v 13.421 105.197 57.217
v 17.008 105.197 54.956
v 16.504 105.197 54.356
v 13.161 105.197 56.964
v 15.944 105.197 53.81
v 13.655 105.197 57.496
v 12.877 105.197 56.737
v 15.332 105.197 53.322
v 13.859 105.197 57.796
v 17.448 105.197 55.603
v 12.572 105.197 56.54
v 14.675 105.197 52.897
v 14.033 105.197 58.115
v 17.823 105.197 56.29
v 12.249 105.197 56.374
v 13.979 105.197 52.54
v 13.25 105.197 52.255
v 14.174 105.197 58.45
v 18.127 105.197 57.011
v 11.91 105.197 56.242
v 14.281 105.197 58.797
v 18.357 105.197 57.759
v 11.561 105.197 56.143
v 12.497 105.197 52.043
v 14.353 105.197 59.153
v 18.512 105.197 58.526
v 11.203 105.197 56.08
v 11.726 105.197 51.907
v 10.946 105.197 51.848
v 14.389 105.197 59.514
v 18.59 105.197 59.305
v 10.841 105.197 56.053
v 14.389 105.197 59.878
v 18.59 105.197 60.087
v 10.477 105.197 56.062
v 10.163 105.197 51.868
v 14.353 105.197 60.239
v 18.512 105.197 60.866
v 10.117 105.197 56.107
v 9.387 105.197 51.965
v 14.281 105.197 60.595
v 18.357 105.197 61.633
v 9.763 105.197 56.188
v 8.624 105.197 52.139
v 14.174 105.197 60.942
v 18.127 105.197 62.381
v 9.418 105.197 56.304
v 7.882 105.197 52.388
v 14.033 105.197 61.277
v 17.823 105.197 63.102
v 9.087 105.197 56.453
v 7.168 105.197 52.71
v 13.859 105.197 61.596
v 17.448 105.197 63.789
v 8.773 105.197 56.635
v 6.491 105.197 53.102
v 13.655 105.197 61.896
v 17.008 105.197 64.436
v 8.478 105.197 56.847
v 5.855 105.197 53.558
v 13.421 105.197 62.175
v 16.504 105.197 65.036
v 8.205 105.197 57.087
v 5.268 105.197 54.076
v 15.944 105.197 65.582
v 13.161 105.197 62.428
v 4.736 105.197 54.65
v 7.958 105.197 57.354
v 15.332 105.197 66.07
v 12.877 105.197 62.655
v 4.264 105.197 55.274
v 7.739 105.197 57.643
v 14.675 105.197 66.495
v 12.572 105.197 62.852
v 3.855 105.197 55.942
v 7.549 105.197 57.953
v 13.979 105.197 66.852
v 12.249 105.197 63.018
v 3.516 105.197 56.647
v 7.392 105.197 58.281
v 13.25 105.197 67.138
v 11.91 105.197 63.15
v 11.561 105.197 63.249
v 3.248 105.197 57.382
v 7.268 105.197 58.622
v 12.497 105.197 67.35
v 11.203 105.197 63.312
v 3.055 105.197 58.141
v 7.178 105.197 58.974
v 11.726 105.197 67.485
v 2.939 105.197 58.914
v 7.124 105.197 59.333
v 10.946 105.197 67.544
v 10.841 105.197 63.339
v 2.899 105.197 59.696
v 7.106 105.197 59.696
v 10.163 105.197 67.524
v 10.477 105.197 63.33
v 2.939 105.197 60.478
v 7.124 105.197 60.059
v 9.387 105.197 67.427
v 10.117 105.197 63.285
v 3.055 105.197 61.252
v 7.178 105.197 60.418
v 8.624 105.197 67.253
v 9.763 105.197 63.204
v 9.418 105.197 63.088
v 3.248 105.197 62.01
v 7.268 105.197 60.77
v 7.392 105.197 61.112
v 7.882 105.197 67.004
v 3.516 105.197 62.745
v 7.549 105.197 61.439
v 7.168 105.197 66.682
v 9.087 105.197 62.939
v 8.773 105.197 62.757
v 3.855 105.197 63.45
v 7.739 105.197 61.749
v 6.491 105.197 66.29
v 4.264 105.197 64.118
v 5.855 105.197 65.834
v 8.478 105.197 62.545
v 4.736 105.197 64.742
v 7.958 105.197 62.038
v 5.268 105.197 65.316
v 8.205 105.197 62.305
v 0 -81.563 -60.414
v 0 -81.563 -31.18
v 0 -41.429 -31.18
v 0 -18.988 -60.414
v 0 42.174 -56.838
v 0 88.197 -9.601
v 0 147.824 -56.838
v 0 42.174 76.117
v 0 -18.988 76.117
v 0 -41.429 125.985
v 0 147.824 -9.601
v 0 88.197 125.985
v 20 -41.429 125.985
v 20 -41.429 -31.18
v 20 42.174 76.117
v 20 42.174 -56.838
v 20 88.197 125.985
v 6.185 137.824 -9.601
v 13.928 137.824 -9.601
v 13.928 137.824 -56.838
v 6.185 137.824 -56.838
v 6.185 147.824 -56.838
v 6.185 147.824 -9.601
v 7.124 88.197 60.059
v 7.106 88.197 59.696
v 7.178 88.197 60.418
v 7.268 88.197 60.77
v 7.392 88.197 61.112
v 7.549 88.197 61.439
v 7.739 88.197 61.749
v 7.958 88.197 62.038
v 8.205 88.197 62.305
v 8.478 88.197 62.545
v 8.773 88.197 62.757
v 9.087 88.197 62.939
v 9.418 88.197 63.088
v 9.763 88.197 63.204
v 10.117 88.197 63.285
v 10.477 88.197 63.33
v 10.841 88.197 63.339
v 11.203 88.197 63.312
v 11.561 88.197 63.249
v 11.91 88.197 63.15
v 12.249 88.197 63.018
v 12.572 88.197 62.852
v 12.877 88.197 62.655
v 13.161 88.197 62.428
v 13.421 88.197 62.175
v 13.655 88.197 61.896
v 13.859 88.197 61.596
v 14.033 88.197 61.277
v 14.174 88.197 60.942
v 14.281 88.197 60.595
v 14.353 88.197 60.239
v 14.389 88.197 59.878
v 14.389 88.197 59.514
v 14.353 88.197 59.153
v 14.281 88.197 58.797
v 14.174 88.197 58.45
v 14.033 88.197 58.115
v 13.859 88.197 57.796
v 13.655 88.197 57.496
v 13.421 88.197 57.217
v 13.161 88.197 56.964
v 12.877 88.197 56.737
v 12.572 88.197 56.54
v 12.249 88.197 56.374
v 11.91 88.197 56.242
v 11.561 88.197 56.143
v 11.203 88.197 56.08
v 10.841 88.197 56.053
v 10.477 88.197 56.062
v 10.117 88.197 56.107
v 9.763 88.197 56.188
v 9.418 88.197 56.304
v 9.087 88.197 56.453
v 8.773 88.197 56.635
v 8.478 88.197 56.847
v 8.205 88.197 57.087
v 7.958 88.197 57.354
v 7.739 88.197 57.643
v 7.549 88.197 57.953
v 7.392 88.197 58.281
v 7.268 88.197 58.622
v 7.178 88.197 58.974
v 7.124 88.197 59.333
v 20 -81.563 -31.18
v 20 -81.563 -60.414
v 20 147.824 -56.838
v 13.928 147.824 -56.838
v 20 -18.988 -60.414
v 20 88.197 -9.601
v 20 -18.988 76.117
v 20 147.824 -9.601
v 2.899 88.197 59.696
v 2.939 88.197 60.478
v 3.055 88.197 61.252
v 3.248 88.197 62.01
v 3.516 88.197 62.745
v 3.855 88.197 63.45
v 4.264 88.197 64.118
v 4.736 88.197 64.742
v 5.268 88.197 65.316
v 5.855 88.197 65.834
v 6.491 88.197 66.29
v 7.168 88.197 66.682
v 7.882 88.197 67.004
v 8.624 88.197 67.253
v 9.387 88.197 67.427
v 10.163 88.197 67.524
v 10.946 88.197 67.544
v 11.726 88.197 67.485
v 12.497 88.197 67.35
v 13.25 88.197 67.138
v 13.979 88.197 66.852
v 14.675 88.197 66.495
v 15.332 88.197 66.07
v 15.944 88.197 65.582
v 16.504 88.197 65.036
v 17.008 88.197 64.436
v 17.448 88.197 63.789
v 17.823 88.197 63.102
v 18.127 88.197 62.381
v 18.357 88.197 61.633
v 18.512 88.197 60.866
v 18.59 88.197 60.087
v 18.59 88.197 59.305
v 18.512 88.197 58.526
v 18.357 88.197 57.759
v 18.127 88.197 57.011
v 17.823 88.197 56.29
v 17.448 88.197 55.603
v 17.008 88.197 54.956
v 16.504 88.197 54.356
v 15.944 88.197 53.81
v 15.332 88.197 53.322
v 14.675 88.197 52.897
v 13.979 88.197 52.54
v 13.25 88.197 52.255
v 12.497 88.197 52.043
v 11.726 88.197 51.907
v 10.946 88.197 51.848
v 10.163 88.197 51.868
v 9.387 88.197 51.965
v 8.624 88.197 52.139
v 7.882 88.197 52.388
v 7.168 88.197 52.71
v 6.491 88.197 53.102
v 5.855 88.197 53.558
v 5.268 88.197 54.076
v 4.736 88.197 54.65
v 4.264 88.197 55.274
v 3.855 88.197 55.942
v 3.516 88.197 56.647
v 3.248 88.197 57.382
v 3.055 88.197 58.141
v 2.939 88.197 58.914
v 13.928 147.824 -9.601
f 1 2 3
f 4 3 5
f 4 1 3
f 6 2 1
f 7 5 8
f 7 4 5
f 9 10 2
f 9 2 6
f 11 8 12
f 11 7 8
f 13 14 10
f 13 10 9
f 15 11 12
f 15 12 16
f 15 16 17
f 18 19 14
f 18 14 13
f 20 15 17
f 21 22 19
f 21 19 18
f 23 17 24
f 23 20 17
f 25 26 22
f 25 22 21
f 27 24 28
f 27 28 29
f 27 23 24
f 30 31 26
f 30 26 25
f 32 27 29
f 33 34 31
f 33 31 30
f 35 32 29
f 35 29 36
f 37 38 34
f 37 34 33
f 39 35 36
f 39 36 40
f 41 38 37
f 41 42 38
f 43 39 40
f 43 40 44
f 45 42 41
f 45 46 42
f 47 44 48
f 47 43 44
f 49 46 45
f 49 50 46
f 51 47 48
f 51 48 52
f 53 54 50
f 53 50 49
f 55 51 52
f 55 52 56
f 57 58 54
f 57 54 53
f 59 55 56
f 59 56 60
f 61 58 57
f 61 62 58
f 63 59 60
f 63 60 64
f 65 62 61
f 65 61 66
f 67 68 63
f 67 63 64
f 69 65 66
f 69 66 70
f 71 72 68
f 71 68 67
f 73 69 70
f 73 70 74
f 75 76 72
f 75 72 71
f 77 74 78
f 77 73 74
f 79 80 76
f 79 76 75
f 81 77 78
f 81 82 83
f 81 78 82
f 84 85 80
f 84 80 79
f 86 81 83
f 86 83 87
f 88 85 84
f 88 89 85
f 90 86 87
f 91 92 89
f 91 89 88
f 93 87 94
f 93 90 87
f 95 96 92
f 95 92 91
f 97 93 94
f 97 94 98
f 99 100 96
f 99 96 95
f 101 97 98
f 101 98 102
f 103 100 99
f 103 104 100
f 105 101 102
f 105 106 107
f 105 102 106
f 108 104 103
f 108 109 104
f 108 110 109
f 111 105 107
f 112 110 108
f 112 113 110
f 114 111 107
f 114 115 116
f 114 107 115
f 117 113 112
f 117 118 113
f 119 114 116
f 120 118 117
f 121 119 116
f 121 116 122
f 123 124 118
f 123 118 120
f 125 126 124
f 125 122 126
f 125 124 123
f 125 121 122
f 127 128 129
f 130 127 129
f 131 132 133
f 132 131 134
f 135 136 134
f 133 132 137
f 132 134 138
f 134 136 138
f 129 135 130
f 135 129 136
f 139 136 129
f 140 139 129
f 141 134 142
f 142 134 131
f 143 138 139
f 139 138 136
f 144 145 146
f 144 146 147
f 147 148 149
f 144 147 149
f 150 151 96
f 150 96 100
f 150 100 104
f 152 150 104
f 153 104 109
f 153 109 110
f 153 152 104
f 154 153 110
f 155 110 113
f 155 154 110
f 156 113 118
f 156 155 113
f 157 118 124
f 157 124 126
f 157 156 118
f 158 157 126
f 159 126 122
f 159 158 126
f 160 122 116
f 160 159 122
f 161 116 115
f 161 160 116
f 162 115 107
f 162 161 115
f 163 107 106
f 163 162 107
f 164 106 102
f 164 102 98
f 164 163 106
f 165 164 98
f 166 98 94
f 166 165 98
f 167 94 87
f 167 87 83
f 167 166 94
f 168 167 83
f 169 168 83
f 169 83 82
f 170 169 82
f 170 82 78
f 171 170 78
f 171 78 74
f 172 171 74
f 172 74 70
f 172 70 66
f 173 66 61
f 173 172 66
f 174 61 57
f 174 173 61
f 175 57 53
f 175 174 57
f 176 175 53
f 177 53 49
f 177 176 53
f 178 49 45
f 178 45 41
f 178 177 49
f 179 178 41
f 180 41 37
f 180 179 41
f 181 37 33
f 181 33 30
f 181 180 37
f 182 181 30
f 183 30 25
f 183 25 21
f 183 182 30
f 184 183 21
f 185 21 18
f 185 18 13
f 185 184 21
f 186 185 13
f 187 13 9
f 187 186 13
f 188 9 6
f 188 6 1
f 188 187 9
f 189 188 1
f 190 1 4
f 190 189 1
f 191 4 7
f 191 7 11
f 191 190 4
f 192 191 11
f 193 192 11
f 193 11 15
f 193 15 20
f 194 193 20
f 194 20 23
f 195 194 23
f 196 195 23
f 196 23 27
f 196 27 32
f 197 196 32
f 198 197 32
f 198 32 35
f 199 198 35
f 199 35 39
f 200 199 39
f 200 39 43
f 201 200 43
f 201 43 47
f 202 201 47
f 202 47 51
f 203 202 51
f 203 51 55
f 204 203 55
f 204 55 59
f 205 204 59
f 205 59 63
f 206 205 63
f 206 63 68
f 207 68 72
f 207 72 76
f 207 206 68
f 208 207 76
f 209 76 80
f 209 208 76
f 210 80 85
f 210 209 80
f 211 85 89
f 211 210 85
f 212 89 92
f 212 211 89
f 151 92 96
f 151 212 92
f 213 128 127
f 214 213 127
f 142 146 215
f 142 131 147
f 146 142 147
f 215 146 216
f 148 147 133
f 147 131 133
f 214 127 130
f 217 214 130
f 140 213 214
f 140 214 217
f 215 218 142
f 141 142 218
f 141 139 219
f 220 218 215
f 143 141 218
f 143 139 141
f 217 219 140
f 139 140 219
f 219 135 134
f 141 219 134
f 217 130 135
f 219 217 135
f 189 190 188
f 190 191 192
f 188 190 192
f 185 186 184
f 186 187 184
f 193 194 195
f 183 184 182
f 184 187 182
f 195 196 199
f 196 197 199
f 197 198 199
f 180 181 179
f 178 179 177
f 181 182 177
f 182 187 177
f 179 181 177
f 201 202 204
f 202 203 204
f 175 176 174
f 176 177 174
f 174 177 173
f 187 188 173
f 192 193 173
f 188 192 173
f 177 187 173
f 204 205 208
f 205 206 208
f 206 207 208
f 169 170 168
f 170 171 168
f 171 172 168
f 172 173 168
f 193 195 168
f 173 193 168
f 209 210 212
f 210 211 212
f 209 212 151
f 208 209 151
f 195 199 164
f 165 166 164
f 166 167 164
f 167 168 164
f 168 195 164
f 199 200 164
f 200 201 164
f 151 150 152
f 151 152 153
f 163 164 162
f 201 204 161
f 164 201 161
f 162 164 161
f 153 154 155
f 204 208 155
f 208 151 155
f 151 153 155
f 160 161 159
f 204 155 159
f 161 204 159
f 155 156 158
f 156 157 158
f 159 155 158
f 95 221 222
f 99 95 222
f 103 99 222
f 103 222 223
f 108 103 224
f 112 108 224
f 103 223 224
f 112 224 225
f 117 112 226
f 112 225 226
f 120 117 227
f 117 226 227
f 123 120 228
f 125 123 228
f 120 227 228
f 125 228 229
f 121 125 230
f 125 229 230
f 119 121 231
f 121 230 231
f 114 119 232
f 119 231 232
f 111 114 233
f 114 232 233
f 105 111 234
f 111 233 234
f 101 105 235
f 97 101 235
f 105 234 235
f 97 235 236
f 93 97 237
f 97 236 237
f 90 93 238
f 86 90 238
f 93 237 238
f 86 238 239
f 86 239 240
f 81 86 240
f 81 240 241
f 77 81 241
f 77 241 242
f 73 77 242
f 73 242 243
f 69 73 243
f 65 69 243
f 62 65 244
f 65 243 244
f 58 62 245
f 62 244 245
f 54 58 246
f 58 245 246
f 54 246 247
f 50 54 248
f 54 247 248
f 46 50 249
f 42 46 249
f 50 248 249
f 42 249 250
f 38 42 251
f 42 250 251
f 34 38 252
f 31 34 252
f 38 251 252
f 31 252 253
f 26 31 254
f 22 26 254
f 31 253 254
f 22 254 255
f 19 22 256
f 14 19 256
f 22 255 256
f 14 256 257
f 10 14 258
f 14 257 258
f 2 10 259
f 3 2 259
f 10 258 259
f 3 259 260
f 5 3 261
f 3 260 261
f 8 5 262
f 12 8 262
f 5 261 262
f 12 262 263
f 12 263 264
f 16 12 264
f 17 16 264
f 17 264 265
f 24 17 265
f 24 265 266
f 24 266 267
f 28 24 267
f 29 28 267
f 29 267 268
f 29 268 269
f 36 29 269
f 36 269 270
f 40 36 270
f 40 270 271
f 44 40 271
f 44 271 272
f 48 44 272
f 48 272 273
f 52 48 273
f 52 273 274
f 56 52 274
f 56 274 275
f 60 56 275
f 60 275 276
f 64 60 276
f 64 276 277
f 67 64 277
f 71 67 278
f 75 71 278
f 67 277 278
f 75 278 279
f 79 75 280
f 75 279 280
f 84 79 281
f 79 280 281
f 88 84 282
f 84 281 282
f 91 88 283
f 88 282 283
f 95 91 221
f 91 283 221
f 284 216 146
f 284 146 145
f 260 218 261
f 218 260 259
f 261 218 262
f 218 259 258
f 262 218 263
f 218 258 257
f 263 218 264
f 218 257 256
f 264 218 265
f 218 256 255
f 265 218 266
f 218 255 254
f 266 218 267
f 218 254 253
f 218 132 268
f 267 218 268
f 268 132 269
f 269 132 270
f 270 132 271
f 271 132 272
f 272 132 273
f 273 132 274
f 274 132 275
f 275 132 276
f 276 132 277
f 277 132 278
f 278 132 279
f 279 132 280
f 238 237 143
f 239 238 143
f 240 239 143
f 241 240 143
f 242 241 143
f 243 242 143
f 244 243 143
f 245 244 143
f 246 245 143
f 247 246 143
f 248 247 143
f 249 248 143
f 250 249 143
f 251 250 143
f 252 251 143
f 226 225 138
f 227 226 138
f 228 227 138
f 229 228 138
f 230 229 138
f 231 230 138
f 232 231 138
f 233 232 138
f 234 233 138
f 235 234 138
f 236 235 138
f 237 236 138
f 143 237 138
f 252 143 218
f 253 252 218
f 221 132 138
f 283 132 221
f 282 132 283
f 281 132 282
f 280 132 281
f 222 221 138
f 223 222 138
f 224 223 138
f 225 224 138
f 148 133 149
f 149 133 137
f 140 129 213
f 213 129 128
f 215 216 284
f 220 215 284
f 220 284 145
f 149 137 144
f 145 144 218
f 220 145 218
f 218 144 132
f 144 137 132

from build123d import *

# Parameters (mm, degrees)
F1_DEPTH = 20
F2_W     = 7.7429511584
F2_H     = 47.2369704668
F3_DEPTH = 10
F4_R     = 7.8502979612
F4_R_2   = 3.6441715019
F5_DEPTH = 17


with BuildPart() as f1:
    # F0 (on Right) → F1 (new body)
    with BuildSketch(Plane.YZ):
        Polygon((-41.4293780923, -31.1796526851), (-81.5630704165, -31.1796526851), (-81.5630704165, -60.4142908512), (-18.9877006452, -60.4142908512), (-18.9877006452, 76.117331113), (42.1743764823, 76.117331113), (42.1743764823, -56.8378705173), (147.8243358508, -56.8378705173), (147.8243358508, -9.6009000506), (88.1971307173, -9.6009000506), (88.1971307173, 125.9854882991), (-41.4293780923, 125.9854882991), align=None)
    extrude(amount=F1_DEPTH)

    # F2 (on face) → F3 (cut)
    with BuildSketch(Plane(origin=(0, 147.8243358508, 0), x_dir=(-1, 0, 0), z_dir=(0, 1, 0))):
        with Locations((-10.0561461877, -33.2193852839)):
            Rectangle(F2_W, F2_H)
    extrude(amount=-F3_DEPTH, mode=Mode.SUBTRACT)

    # F4 (on face) → F5 (join)
    with BuildSketch(Plane(origin=(0, 88.1971307173, 0), x_dir=(-1, 0, 0), z_dir=(0, 1, 0))):
        with Locations((-10.7497964054, 59.6960298717)):
            Circle(F4_R)
        with Locations((-10.7497964054, 59.6960298717)):
            Circle(F4_R_2, mode=Mode.SUBTRACT)
    extrude(amount=F5_DEPTH)


solid = f1.part
